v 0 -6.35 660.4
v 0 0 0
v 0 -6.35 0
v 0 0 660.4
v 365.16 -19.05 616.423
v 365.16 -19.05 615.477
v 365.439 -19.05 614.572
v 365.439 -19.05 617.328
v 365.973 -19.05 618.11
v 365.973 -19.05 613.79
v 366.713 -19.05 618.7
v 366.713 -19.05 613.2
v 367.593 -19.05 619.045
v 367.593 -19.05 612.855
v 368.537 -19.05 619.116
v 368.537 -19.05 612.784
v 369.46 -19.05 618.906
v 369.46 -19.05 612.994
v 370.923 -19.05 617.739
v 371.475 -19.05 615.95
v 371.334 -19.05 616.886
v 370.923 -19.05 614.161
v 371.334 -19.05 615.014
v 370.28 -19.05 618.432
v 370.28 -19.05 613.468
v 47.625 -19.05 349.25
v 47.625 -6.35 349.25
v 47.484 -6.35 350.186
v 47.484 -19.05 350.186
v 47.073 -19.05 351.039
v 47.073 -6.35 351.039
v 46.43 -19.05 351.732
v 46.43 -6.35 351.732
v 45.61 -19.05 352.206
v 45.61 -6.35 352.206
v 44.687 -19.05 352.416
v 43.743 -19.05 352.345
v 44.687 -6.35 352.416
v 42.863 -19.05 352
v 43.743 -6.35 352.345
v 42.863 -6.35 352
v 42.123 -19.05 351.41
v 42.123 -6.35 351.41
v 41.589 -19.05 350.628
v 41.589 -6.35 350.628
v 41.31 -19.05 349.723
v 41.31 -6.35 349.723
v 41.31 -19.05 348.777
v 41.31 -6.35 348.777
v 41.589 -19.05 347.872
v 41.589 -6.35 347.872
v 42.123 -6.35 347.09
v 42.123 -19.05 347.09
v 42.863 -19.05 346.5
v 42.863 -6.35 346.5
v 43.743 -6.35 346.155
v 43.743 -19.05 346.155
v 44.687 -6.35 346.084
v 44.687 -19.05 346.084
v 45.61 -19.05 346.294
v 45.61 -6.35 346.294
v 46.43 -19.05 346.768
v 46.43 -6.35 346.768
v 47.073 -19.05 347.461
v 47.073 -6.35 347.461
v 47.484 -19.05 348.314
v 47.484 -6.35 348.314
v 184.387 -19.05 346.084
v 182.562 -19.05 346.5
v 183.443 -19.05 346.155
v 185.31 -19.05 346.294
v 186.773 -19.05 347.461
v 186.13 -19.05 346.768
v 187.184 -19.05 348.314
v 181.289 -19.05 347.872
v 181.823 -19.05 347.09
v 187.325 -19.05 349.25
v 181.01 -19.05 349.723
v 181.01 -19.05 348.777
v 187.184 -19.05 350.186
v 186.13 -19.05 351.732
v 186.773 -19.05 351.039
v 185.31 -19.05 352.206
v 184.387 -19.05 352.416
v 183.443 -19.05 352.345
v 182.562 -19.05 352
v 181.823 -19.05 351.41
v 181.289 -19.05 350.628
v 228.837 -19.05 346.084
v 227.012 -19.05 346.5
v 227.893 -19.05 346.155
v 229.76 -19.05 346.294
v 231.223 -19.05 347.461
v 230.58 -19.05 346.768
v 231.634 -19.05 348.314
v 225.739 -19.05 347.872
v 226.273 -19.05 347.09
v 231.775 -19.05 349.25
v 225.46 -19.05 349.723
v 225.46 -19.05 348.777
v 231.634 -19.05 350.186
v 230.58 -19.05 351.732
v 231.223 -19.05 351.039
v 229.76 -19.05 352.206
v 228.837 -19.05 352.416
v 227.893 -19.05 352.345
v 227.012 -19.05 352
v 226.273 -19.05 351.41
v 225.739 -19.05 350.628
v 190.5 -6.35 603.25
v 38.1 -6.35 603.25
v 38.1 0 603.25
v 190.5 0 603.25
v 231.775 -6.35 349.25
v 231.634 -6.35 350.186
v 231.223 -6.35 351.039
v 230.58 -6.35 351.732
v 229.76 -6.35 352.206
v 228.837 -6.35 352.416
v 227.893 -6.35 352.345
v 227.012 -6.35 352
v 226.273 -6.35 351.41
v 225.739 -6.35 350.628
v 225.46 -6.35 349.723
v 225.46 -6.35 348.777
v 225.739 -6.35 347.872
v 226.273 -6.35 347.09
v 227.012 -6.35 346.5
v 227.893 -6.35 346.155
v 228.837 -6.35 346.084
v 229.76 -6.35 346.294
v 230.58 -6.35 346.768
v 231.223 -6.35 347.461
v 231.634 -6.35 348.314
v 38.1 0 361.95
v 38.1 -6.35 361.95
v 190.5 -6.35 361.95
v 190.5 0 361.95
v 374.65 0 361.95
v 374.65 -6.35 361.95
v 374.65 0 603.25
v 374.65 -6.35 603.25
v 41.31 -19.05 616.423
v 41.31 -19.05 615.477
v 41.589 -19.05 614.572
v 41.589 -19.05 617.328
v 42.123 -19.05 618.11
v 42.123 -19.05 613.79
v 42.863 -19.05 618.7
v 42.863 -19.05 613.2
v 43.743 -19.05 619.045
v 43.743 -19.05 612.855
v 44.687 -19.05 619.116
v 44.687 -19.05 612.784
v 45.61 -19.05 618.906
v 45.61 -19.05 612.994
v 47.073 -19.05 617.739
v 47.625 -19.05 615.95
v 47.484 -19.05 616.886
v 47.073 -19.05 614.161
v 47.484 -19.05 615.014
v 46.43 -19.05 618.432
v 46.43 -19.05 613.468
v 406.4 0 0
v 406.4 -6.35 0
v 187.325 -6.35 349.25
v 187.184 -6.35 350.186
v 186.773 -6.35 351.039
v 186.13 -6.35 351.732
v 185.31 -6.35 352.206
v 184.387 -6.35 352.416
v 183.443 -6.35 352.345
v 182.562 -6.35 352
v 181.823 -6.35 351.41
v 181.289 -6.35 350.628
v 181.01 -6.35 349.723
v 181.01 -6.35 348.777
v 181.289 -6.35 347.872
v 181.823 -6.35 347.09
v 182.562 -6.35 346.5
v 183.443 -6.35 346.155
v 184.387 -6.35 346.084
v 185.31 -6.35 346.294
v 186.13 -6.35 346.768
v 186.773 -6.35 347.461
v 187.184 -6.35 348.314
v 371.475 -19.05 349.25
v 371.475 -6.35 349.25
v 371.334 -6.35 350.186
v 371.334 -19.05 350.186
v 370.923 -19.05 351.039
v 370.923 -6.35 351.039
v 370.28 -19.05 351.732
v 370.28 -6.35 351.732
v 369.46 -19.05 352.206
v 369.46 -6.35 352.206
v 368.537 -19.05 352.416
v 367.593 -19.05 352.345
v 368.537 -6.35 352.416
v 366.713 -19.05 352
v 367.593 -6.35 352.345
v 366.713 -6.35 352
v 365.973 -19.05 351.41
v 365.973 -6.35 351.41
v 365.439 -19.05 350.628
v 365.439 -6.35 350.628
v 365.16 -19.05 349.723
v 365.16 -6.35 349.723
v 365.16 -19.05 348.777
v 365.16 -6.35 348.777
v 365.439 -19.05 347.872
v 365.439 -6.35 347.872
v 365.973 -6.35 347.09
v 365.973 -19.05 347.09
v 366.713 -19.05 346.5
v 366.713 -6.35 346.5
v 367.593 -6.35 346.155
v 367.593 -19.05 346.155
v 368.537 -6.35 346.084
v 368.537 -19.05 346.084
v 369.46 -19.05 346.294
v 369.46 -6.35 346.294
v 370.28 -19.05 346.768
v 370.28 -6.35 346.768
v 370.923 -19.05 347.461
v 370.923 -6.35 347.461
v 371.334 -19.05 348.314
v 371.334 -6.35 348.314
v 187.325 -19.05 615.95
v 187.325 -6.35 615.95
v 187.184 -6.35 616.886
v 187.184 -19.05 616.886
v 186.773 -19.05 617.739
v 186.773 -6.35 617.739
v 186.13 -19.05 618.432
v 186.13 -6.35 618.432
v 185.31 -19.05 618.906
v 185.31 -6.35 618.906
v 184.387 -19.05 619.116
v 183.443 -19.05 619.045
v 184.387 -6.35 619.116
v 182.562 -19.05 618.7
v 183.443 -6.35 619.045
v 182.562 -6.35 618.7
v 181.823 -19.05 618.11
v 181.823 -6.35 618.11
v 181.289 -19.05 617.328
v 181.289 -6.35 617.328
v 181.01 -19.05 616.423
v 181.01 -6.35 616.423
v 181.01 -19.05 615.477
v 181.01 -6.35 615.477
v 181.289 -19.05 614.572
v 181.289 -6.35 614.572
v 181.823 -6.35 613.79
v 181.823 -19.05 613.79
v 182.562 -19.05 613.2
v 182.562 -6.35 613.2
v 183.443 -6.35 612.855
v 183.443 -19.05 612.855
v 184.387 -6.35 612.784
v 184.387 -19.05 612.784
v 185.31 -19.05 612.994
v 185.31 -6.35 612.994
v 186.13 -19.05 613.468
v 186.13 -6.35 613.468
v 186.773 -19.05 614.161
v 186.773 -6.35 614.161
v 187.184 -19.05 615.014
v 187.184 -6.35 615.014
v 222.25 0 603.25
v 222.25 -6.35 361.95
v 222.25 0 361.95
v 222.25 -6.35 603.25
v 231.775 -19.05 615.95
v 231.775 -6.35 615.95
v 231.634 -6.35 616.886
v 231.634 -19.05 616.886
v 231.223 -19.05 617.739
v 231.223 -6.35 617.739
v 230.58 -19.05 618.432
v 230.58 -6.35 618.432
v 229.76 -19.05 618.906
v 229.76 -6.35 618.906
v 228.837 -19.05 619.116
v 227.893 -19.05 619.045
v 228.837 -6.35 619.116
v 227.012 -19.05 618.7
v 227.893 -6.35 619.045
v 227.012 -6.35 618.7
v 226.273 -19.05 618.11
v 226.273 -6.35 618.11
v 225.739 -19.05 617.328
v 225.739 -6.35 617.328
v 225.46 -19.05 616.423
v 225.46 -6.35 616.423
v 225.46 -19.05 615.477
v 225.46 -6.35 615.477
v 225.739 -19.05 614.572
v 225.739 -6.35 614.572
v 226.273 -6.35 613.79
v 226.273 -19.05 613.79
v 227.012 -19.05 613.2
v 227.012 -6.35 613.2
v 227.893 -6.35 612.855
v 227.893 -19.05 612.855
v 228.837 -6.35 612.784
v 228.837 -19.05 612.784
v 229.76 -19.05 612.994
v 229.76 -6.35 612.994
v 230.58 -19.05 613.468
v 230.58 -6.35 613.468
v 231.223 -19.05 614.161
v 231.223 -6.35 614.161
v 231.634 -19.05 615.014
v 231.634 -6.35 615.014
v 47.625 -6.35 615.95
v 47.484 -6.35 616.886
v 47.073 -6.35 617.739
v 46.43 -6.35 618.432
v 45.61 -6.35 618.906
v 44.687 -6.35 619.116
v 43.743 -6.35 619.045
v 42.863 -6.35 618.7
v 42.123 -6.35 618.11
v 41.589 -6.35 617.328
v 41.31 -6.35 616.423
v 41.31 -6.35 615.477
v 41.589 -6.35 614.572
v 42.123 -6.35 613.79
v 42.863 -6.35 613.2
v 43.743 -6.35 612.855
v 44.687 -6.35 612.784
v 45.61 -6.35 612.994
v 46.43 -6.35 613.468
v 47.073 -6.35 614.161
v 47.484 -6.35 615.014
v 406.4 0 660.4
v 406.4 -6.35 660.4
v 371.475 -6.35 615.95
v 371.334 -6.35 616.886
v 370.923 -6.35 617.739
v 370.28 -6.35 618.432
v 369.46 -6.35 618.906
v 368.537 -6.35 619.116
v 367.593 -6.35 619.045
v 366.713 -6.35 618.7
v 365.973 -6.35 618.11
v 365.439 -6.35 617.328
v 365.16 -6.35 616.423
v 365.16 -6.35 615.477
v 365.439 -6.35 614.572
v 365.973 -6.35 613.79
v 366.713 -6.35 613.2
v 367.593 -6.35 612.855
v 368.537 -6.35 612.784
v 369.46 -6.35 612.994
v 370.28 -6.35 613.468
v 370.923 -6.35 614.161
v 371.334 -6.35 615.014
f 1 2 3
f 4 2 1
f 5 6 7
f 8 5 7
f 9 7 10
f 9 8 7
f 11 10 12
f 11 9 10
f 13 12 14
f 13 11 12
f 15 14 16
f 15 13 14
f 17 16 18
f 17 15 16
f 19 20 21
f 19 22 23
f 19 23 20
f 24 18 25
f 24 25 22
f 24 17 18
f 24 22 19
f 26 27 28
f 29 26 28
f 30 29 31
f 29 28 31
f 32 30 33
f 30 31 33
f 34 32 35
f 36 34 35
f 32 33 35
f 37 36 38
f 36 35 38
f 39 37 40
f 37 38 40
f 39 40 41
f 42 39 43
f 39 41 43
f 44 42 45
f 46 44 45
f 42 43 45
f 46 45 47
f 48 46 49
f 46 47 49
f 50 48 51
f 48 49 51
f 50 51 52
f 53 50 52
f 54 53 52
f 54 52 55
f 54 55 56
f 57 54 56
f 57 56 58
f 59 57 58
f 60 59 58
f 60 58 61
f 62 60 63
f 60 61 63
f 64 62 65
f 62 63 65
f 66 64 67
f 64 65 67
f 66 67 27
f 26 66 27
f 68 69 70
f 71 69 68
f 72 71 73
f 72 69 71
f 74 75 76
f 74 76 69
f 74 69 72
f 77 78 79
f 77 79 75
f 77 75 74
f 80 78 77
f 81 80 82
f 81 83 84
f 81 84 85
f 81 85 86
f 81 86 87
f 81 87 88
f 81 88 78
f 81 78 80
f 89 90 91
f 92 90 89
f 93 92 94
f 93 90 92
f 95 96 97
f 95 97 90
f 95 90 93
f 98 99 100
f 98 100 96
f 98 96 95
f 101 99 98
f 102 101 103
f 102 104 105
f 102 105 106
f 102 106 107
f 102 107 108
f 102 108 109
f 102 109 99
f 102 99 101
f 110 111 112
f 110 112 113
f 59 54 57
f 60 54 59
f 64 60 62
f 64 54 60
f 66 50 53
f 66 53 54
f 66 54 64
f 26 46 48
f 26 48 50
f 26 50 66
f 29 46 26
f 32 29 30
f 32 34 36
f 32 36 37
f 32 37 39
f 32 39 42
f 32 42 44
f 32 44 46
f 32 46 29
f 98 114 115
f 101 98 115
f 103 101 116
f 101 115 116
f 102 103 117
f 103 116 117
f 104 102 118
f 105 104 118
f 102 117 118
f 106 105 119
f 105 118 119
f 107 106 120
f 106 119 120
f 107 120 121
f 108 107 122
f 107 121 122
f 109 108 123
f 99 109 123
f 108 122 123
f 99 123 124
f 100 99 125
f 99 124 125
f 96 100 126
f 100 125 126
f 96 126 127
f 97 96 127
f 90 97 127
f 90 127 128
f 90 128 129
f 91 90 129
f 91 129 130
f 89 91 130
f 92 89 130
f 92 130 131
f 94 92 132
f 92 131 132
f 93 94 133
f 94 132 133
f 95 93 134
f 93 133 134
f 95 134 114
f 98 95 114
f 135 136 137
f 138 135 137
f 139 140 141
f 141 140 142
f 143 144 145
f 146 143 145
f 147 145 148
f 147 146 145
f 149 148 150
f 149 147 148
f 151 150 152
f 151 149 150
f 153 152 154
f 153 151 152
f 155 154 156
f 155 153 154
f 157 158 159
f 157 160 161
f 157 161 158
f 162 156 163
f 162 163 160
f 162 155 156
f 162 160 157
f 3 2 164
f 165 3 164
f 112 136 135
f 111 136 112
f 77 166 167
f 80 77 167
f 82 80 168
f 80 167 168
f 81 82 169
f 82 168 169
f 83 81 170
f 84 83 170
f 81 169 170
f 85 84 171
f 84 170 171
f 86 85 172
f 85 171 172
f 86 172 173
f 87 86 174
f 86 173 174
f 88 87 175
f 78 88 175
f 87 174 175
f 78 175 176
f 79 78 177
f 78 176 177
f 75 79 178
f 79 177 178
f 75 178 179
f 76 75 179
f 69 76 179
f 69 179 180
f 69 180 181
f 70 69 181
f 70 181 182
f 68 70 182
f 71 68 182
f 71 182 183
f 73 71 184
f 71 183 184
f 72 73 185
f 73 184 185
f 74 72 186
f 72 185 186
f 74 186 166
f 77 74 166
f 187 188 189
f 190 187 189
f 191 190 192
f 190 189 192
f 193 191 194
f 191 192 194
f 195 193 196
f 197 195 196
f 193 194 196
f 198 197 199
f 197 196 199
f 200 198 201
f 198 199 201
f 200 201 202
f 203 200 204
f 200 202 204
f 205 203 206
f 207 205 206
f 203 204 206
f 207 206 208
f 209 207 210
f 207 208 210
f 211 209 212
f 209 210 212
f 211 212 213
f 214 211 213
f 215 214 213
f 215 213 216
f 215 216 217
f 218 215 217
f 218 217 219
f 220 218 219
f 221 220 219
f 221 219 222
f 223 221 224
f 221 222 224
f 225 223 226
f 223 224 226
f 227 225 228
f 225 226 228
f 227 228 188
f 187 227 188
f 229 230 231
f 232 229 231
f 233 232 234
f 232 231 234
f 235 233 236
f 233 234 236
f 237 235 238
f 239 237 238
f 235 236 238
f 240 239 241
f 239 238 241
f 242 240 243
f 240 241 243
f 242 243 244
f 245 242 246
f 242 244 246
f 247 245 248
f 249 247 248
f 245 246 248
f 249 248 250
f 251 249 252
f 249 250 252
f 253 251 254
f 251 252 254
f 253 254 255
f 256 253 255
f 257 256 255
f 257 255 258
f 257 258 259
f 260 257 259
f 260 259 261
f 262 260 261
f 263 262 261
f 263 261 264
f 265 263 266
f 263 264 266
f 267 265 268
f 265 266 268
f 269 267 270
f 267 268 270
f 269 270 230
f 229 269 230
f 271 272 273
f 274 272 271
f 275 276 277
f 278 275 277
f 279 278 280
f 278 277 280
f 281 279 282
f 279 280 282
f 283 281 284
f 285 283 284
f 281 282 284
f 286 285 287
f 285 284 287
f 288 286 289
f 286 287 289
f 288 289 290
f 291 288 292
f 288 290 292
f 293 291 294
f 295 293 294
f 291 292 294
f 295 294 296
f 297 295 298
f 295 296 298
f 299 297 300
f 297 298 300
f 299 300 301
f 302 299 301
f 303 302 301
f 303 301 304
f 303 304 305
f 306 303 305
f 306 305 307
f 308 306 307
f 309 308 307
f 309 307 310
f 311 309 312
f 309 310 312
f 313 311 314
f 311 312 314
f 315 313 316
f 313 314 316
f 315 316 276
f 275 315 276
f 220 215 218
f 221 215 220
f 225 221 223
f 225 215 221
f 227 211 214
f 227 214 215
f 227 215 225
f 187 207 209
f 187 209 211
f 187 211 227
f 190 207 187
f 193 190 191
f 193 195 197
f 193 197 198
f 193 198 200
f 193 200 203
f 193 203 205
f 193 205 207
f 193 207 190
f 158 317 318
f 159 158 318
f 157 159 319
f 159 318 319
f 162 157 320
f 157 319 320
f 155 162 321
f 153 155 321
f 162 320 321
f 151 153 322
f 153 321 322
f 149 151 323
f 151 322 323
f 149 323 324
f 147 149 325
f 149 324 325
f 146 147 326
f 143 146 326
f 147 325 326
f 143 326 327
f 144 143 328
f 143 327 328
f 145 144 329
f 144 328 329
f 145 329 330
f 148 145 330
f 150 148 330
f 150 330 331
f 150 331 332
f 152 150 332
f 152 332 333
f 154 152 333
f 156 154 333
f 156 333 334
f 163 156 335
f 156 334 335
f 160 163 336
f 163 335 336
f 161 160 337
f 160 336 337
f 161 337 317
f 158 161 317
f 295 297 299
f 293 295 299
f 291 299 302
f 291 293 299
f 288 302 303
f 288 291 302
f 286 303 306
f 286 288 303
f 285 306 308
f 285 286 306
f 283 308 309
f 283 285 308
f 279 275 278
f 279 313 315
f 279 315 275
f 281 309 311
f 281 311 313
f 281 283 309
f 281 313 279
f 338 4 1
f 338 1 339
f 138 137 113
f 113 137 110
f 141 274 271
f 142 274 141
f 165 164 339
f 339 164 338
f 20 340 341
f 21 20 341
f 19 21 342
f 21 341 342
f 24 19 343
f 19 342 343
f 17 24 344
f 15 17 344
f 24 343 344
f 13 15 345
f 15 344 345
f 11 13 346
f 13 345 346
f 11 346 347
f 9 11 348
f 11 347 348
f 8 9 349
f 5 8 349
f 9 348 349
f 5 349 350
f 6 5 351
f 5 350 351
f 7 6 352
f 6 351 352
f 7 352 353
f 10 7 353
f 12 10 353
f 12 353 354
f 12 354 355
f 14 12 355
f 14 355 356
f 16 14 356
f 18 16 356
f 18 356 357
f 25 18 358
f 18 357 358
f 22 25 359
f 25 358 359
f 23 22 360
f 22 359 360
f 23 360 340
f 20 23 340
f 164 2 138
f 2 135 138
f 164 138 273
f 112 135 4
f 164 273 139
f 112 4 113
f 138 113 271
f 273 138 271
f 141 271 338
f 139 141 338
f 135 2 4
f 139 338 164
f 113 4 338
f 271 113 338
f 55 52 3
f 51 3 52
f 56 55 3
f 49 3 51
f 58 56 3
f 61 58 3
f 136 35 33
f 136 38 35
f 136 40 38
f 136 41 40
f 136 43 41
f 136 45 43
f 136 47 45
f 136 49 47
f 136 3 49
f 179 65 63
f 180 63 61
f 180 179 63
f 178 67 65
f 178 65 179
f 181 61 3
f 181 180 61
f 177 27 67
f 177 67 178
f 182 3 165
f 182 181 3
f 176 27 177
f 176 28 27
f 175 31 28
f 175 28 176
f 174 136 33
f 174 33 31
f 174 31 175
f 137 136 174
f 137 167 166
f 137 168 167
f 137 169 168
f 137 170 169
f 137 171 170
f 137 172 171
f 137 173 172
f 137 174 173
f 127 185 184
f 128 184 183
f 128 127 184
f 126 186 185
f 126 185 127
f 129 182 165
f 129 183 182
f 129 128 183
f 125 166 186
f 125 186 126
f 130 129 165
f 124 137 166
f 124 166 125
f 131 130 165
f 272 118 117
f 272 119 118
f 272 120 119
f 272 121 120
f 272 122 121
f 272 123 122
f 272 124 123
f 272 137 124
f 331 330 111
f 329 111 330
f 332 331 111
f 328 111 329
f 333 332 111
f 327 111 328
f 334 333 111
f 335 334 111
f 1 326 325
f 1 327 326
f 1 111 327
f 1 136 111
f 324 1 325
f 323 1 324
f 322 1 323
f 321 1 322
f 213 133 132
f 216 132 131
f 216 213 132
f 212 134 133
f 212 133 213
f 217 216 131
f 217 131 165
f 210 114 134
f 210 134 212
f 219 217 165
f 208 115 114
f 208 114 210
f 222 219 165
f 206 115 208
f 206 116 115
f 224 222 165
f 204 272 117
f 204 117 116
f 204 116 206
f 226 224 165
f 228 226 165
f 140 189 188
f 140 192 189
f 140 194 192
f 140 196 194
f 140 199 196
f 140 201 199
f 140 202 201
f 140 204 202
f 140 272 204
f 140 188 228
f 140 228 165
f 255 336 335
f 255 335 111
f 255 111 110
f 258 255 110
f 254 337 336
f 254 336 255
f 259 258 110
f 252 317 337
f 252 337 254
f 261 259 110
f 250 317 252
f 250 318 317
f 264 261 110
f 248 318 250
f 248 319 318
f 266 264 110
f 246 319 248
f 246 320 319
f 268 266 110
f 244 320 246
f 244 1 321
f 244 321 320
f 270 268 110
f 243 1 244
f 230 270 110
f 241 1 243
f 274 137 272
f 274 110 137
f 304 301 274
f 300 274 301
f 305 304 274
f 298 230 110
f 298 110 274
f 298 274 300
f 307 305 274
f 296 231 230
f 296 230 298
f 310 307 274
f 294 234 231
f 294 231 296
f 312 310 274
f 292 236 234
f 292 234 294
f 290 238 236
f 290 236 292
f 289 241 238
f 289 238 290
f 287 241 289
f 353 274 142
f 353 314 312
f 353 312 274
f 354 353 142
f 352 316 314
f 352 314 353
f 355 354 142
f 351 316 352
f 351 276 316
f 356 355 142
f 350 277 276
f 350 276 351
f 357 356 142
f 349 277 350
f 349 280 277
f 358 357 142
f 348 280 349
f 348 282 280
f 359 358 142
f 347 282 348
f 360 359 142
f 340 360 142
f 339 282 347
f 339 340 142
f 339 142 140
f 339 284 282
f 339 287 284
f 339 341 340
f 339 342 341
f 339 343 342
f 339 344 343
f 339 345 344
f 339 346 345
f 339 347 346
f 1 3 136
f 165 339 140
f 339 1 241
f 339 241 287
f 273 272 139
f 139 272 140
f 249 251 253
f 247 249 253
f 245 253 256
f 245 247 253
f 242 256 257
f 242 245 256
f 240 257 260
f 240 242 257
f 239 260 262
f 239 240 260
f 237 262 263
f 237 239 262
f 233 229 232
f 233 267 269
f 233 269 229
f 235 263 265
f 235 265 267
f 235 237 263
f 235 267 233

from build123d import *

# Parameters (mm, degrees)
F0_W     = 406.4
F0_H     = 660.4
F1_DEPTH = 6.35
F2_W     = 152.4
F2_H     = 241.3
F3_DEPTH = 6.351
F4_R     = 3.175
F5_DEPTH = 12.7


with BuildPart() as f1:
    # F0 (on Front) → F1 (new body)
    with BuildSketch(Plane.XZ):
        with Locations((203.2, 330.2)):
            Rectangle(F0_W, F0_H)
    extrude(amount=F1_DEPTH)

    # F2 (on face) → F3 (cut, through all)
    with BuildSketch(Plane.XZ.offset(6.35)):
        with Locations((114.3, 482.6)):
            Rectangle(F2_W, F2_H)
        with Locations((298.45, 482.6)):
            Rectangle(F2_W, F2_H)
    extrude(amount=-F3_DEPTH, mode=Mode.SUBTRACT)

    # F4 (on face) → F5 (join)
    with BuildSketch(Plane.XZ.offset(6.35)):
        with Locations((44.45, 615.95)):
            Circle(F4_R)
        with Locations((184.15, 615.95)):
            Circle(F4_R)
        with Locations((44.45, 349.25)):
            Circle(F4_R)
        with Locations((184.15, 349.25)):
            Circle(F4_R)
        with Locations((228.6, 615.95)):
            Circle(F4_R)
        with Locations((368.3, 615.95)):
            Circle(F4_R)
        with Locations((228.6, 349.25)):
            Circle(F4_R)
        with Locations((368.3, 349.25)):
            Circle(F4_R)
    extrude(amount=F5_DEPTH)


solid = f1.part
